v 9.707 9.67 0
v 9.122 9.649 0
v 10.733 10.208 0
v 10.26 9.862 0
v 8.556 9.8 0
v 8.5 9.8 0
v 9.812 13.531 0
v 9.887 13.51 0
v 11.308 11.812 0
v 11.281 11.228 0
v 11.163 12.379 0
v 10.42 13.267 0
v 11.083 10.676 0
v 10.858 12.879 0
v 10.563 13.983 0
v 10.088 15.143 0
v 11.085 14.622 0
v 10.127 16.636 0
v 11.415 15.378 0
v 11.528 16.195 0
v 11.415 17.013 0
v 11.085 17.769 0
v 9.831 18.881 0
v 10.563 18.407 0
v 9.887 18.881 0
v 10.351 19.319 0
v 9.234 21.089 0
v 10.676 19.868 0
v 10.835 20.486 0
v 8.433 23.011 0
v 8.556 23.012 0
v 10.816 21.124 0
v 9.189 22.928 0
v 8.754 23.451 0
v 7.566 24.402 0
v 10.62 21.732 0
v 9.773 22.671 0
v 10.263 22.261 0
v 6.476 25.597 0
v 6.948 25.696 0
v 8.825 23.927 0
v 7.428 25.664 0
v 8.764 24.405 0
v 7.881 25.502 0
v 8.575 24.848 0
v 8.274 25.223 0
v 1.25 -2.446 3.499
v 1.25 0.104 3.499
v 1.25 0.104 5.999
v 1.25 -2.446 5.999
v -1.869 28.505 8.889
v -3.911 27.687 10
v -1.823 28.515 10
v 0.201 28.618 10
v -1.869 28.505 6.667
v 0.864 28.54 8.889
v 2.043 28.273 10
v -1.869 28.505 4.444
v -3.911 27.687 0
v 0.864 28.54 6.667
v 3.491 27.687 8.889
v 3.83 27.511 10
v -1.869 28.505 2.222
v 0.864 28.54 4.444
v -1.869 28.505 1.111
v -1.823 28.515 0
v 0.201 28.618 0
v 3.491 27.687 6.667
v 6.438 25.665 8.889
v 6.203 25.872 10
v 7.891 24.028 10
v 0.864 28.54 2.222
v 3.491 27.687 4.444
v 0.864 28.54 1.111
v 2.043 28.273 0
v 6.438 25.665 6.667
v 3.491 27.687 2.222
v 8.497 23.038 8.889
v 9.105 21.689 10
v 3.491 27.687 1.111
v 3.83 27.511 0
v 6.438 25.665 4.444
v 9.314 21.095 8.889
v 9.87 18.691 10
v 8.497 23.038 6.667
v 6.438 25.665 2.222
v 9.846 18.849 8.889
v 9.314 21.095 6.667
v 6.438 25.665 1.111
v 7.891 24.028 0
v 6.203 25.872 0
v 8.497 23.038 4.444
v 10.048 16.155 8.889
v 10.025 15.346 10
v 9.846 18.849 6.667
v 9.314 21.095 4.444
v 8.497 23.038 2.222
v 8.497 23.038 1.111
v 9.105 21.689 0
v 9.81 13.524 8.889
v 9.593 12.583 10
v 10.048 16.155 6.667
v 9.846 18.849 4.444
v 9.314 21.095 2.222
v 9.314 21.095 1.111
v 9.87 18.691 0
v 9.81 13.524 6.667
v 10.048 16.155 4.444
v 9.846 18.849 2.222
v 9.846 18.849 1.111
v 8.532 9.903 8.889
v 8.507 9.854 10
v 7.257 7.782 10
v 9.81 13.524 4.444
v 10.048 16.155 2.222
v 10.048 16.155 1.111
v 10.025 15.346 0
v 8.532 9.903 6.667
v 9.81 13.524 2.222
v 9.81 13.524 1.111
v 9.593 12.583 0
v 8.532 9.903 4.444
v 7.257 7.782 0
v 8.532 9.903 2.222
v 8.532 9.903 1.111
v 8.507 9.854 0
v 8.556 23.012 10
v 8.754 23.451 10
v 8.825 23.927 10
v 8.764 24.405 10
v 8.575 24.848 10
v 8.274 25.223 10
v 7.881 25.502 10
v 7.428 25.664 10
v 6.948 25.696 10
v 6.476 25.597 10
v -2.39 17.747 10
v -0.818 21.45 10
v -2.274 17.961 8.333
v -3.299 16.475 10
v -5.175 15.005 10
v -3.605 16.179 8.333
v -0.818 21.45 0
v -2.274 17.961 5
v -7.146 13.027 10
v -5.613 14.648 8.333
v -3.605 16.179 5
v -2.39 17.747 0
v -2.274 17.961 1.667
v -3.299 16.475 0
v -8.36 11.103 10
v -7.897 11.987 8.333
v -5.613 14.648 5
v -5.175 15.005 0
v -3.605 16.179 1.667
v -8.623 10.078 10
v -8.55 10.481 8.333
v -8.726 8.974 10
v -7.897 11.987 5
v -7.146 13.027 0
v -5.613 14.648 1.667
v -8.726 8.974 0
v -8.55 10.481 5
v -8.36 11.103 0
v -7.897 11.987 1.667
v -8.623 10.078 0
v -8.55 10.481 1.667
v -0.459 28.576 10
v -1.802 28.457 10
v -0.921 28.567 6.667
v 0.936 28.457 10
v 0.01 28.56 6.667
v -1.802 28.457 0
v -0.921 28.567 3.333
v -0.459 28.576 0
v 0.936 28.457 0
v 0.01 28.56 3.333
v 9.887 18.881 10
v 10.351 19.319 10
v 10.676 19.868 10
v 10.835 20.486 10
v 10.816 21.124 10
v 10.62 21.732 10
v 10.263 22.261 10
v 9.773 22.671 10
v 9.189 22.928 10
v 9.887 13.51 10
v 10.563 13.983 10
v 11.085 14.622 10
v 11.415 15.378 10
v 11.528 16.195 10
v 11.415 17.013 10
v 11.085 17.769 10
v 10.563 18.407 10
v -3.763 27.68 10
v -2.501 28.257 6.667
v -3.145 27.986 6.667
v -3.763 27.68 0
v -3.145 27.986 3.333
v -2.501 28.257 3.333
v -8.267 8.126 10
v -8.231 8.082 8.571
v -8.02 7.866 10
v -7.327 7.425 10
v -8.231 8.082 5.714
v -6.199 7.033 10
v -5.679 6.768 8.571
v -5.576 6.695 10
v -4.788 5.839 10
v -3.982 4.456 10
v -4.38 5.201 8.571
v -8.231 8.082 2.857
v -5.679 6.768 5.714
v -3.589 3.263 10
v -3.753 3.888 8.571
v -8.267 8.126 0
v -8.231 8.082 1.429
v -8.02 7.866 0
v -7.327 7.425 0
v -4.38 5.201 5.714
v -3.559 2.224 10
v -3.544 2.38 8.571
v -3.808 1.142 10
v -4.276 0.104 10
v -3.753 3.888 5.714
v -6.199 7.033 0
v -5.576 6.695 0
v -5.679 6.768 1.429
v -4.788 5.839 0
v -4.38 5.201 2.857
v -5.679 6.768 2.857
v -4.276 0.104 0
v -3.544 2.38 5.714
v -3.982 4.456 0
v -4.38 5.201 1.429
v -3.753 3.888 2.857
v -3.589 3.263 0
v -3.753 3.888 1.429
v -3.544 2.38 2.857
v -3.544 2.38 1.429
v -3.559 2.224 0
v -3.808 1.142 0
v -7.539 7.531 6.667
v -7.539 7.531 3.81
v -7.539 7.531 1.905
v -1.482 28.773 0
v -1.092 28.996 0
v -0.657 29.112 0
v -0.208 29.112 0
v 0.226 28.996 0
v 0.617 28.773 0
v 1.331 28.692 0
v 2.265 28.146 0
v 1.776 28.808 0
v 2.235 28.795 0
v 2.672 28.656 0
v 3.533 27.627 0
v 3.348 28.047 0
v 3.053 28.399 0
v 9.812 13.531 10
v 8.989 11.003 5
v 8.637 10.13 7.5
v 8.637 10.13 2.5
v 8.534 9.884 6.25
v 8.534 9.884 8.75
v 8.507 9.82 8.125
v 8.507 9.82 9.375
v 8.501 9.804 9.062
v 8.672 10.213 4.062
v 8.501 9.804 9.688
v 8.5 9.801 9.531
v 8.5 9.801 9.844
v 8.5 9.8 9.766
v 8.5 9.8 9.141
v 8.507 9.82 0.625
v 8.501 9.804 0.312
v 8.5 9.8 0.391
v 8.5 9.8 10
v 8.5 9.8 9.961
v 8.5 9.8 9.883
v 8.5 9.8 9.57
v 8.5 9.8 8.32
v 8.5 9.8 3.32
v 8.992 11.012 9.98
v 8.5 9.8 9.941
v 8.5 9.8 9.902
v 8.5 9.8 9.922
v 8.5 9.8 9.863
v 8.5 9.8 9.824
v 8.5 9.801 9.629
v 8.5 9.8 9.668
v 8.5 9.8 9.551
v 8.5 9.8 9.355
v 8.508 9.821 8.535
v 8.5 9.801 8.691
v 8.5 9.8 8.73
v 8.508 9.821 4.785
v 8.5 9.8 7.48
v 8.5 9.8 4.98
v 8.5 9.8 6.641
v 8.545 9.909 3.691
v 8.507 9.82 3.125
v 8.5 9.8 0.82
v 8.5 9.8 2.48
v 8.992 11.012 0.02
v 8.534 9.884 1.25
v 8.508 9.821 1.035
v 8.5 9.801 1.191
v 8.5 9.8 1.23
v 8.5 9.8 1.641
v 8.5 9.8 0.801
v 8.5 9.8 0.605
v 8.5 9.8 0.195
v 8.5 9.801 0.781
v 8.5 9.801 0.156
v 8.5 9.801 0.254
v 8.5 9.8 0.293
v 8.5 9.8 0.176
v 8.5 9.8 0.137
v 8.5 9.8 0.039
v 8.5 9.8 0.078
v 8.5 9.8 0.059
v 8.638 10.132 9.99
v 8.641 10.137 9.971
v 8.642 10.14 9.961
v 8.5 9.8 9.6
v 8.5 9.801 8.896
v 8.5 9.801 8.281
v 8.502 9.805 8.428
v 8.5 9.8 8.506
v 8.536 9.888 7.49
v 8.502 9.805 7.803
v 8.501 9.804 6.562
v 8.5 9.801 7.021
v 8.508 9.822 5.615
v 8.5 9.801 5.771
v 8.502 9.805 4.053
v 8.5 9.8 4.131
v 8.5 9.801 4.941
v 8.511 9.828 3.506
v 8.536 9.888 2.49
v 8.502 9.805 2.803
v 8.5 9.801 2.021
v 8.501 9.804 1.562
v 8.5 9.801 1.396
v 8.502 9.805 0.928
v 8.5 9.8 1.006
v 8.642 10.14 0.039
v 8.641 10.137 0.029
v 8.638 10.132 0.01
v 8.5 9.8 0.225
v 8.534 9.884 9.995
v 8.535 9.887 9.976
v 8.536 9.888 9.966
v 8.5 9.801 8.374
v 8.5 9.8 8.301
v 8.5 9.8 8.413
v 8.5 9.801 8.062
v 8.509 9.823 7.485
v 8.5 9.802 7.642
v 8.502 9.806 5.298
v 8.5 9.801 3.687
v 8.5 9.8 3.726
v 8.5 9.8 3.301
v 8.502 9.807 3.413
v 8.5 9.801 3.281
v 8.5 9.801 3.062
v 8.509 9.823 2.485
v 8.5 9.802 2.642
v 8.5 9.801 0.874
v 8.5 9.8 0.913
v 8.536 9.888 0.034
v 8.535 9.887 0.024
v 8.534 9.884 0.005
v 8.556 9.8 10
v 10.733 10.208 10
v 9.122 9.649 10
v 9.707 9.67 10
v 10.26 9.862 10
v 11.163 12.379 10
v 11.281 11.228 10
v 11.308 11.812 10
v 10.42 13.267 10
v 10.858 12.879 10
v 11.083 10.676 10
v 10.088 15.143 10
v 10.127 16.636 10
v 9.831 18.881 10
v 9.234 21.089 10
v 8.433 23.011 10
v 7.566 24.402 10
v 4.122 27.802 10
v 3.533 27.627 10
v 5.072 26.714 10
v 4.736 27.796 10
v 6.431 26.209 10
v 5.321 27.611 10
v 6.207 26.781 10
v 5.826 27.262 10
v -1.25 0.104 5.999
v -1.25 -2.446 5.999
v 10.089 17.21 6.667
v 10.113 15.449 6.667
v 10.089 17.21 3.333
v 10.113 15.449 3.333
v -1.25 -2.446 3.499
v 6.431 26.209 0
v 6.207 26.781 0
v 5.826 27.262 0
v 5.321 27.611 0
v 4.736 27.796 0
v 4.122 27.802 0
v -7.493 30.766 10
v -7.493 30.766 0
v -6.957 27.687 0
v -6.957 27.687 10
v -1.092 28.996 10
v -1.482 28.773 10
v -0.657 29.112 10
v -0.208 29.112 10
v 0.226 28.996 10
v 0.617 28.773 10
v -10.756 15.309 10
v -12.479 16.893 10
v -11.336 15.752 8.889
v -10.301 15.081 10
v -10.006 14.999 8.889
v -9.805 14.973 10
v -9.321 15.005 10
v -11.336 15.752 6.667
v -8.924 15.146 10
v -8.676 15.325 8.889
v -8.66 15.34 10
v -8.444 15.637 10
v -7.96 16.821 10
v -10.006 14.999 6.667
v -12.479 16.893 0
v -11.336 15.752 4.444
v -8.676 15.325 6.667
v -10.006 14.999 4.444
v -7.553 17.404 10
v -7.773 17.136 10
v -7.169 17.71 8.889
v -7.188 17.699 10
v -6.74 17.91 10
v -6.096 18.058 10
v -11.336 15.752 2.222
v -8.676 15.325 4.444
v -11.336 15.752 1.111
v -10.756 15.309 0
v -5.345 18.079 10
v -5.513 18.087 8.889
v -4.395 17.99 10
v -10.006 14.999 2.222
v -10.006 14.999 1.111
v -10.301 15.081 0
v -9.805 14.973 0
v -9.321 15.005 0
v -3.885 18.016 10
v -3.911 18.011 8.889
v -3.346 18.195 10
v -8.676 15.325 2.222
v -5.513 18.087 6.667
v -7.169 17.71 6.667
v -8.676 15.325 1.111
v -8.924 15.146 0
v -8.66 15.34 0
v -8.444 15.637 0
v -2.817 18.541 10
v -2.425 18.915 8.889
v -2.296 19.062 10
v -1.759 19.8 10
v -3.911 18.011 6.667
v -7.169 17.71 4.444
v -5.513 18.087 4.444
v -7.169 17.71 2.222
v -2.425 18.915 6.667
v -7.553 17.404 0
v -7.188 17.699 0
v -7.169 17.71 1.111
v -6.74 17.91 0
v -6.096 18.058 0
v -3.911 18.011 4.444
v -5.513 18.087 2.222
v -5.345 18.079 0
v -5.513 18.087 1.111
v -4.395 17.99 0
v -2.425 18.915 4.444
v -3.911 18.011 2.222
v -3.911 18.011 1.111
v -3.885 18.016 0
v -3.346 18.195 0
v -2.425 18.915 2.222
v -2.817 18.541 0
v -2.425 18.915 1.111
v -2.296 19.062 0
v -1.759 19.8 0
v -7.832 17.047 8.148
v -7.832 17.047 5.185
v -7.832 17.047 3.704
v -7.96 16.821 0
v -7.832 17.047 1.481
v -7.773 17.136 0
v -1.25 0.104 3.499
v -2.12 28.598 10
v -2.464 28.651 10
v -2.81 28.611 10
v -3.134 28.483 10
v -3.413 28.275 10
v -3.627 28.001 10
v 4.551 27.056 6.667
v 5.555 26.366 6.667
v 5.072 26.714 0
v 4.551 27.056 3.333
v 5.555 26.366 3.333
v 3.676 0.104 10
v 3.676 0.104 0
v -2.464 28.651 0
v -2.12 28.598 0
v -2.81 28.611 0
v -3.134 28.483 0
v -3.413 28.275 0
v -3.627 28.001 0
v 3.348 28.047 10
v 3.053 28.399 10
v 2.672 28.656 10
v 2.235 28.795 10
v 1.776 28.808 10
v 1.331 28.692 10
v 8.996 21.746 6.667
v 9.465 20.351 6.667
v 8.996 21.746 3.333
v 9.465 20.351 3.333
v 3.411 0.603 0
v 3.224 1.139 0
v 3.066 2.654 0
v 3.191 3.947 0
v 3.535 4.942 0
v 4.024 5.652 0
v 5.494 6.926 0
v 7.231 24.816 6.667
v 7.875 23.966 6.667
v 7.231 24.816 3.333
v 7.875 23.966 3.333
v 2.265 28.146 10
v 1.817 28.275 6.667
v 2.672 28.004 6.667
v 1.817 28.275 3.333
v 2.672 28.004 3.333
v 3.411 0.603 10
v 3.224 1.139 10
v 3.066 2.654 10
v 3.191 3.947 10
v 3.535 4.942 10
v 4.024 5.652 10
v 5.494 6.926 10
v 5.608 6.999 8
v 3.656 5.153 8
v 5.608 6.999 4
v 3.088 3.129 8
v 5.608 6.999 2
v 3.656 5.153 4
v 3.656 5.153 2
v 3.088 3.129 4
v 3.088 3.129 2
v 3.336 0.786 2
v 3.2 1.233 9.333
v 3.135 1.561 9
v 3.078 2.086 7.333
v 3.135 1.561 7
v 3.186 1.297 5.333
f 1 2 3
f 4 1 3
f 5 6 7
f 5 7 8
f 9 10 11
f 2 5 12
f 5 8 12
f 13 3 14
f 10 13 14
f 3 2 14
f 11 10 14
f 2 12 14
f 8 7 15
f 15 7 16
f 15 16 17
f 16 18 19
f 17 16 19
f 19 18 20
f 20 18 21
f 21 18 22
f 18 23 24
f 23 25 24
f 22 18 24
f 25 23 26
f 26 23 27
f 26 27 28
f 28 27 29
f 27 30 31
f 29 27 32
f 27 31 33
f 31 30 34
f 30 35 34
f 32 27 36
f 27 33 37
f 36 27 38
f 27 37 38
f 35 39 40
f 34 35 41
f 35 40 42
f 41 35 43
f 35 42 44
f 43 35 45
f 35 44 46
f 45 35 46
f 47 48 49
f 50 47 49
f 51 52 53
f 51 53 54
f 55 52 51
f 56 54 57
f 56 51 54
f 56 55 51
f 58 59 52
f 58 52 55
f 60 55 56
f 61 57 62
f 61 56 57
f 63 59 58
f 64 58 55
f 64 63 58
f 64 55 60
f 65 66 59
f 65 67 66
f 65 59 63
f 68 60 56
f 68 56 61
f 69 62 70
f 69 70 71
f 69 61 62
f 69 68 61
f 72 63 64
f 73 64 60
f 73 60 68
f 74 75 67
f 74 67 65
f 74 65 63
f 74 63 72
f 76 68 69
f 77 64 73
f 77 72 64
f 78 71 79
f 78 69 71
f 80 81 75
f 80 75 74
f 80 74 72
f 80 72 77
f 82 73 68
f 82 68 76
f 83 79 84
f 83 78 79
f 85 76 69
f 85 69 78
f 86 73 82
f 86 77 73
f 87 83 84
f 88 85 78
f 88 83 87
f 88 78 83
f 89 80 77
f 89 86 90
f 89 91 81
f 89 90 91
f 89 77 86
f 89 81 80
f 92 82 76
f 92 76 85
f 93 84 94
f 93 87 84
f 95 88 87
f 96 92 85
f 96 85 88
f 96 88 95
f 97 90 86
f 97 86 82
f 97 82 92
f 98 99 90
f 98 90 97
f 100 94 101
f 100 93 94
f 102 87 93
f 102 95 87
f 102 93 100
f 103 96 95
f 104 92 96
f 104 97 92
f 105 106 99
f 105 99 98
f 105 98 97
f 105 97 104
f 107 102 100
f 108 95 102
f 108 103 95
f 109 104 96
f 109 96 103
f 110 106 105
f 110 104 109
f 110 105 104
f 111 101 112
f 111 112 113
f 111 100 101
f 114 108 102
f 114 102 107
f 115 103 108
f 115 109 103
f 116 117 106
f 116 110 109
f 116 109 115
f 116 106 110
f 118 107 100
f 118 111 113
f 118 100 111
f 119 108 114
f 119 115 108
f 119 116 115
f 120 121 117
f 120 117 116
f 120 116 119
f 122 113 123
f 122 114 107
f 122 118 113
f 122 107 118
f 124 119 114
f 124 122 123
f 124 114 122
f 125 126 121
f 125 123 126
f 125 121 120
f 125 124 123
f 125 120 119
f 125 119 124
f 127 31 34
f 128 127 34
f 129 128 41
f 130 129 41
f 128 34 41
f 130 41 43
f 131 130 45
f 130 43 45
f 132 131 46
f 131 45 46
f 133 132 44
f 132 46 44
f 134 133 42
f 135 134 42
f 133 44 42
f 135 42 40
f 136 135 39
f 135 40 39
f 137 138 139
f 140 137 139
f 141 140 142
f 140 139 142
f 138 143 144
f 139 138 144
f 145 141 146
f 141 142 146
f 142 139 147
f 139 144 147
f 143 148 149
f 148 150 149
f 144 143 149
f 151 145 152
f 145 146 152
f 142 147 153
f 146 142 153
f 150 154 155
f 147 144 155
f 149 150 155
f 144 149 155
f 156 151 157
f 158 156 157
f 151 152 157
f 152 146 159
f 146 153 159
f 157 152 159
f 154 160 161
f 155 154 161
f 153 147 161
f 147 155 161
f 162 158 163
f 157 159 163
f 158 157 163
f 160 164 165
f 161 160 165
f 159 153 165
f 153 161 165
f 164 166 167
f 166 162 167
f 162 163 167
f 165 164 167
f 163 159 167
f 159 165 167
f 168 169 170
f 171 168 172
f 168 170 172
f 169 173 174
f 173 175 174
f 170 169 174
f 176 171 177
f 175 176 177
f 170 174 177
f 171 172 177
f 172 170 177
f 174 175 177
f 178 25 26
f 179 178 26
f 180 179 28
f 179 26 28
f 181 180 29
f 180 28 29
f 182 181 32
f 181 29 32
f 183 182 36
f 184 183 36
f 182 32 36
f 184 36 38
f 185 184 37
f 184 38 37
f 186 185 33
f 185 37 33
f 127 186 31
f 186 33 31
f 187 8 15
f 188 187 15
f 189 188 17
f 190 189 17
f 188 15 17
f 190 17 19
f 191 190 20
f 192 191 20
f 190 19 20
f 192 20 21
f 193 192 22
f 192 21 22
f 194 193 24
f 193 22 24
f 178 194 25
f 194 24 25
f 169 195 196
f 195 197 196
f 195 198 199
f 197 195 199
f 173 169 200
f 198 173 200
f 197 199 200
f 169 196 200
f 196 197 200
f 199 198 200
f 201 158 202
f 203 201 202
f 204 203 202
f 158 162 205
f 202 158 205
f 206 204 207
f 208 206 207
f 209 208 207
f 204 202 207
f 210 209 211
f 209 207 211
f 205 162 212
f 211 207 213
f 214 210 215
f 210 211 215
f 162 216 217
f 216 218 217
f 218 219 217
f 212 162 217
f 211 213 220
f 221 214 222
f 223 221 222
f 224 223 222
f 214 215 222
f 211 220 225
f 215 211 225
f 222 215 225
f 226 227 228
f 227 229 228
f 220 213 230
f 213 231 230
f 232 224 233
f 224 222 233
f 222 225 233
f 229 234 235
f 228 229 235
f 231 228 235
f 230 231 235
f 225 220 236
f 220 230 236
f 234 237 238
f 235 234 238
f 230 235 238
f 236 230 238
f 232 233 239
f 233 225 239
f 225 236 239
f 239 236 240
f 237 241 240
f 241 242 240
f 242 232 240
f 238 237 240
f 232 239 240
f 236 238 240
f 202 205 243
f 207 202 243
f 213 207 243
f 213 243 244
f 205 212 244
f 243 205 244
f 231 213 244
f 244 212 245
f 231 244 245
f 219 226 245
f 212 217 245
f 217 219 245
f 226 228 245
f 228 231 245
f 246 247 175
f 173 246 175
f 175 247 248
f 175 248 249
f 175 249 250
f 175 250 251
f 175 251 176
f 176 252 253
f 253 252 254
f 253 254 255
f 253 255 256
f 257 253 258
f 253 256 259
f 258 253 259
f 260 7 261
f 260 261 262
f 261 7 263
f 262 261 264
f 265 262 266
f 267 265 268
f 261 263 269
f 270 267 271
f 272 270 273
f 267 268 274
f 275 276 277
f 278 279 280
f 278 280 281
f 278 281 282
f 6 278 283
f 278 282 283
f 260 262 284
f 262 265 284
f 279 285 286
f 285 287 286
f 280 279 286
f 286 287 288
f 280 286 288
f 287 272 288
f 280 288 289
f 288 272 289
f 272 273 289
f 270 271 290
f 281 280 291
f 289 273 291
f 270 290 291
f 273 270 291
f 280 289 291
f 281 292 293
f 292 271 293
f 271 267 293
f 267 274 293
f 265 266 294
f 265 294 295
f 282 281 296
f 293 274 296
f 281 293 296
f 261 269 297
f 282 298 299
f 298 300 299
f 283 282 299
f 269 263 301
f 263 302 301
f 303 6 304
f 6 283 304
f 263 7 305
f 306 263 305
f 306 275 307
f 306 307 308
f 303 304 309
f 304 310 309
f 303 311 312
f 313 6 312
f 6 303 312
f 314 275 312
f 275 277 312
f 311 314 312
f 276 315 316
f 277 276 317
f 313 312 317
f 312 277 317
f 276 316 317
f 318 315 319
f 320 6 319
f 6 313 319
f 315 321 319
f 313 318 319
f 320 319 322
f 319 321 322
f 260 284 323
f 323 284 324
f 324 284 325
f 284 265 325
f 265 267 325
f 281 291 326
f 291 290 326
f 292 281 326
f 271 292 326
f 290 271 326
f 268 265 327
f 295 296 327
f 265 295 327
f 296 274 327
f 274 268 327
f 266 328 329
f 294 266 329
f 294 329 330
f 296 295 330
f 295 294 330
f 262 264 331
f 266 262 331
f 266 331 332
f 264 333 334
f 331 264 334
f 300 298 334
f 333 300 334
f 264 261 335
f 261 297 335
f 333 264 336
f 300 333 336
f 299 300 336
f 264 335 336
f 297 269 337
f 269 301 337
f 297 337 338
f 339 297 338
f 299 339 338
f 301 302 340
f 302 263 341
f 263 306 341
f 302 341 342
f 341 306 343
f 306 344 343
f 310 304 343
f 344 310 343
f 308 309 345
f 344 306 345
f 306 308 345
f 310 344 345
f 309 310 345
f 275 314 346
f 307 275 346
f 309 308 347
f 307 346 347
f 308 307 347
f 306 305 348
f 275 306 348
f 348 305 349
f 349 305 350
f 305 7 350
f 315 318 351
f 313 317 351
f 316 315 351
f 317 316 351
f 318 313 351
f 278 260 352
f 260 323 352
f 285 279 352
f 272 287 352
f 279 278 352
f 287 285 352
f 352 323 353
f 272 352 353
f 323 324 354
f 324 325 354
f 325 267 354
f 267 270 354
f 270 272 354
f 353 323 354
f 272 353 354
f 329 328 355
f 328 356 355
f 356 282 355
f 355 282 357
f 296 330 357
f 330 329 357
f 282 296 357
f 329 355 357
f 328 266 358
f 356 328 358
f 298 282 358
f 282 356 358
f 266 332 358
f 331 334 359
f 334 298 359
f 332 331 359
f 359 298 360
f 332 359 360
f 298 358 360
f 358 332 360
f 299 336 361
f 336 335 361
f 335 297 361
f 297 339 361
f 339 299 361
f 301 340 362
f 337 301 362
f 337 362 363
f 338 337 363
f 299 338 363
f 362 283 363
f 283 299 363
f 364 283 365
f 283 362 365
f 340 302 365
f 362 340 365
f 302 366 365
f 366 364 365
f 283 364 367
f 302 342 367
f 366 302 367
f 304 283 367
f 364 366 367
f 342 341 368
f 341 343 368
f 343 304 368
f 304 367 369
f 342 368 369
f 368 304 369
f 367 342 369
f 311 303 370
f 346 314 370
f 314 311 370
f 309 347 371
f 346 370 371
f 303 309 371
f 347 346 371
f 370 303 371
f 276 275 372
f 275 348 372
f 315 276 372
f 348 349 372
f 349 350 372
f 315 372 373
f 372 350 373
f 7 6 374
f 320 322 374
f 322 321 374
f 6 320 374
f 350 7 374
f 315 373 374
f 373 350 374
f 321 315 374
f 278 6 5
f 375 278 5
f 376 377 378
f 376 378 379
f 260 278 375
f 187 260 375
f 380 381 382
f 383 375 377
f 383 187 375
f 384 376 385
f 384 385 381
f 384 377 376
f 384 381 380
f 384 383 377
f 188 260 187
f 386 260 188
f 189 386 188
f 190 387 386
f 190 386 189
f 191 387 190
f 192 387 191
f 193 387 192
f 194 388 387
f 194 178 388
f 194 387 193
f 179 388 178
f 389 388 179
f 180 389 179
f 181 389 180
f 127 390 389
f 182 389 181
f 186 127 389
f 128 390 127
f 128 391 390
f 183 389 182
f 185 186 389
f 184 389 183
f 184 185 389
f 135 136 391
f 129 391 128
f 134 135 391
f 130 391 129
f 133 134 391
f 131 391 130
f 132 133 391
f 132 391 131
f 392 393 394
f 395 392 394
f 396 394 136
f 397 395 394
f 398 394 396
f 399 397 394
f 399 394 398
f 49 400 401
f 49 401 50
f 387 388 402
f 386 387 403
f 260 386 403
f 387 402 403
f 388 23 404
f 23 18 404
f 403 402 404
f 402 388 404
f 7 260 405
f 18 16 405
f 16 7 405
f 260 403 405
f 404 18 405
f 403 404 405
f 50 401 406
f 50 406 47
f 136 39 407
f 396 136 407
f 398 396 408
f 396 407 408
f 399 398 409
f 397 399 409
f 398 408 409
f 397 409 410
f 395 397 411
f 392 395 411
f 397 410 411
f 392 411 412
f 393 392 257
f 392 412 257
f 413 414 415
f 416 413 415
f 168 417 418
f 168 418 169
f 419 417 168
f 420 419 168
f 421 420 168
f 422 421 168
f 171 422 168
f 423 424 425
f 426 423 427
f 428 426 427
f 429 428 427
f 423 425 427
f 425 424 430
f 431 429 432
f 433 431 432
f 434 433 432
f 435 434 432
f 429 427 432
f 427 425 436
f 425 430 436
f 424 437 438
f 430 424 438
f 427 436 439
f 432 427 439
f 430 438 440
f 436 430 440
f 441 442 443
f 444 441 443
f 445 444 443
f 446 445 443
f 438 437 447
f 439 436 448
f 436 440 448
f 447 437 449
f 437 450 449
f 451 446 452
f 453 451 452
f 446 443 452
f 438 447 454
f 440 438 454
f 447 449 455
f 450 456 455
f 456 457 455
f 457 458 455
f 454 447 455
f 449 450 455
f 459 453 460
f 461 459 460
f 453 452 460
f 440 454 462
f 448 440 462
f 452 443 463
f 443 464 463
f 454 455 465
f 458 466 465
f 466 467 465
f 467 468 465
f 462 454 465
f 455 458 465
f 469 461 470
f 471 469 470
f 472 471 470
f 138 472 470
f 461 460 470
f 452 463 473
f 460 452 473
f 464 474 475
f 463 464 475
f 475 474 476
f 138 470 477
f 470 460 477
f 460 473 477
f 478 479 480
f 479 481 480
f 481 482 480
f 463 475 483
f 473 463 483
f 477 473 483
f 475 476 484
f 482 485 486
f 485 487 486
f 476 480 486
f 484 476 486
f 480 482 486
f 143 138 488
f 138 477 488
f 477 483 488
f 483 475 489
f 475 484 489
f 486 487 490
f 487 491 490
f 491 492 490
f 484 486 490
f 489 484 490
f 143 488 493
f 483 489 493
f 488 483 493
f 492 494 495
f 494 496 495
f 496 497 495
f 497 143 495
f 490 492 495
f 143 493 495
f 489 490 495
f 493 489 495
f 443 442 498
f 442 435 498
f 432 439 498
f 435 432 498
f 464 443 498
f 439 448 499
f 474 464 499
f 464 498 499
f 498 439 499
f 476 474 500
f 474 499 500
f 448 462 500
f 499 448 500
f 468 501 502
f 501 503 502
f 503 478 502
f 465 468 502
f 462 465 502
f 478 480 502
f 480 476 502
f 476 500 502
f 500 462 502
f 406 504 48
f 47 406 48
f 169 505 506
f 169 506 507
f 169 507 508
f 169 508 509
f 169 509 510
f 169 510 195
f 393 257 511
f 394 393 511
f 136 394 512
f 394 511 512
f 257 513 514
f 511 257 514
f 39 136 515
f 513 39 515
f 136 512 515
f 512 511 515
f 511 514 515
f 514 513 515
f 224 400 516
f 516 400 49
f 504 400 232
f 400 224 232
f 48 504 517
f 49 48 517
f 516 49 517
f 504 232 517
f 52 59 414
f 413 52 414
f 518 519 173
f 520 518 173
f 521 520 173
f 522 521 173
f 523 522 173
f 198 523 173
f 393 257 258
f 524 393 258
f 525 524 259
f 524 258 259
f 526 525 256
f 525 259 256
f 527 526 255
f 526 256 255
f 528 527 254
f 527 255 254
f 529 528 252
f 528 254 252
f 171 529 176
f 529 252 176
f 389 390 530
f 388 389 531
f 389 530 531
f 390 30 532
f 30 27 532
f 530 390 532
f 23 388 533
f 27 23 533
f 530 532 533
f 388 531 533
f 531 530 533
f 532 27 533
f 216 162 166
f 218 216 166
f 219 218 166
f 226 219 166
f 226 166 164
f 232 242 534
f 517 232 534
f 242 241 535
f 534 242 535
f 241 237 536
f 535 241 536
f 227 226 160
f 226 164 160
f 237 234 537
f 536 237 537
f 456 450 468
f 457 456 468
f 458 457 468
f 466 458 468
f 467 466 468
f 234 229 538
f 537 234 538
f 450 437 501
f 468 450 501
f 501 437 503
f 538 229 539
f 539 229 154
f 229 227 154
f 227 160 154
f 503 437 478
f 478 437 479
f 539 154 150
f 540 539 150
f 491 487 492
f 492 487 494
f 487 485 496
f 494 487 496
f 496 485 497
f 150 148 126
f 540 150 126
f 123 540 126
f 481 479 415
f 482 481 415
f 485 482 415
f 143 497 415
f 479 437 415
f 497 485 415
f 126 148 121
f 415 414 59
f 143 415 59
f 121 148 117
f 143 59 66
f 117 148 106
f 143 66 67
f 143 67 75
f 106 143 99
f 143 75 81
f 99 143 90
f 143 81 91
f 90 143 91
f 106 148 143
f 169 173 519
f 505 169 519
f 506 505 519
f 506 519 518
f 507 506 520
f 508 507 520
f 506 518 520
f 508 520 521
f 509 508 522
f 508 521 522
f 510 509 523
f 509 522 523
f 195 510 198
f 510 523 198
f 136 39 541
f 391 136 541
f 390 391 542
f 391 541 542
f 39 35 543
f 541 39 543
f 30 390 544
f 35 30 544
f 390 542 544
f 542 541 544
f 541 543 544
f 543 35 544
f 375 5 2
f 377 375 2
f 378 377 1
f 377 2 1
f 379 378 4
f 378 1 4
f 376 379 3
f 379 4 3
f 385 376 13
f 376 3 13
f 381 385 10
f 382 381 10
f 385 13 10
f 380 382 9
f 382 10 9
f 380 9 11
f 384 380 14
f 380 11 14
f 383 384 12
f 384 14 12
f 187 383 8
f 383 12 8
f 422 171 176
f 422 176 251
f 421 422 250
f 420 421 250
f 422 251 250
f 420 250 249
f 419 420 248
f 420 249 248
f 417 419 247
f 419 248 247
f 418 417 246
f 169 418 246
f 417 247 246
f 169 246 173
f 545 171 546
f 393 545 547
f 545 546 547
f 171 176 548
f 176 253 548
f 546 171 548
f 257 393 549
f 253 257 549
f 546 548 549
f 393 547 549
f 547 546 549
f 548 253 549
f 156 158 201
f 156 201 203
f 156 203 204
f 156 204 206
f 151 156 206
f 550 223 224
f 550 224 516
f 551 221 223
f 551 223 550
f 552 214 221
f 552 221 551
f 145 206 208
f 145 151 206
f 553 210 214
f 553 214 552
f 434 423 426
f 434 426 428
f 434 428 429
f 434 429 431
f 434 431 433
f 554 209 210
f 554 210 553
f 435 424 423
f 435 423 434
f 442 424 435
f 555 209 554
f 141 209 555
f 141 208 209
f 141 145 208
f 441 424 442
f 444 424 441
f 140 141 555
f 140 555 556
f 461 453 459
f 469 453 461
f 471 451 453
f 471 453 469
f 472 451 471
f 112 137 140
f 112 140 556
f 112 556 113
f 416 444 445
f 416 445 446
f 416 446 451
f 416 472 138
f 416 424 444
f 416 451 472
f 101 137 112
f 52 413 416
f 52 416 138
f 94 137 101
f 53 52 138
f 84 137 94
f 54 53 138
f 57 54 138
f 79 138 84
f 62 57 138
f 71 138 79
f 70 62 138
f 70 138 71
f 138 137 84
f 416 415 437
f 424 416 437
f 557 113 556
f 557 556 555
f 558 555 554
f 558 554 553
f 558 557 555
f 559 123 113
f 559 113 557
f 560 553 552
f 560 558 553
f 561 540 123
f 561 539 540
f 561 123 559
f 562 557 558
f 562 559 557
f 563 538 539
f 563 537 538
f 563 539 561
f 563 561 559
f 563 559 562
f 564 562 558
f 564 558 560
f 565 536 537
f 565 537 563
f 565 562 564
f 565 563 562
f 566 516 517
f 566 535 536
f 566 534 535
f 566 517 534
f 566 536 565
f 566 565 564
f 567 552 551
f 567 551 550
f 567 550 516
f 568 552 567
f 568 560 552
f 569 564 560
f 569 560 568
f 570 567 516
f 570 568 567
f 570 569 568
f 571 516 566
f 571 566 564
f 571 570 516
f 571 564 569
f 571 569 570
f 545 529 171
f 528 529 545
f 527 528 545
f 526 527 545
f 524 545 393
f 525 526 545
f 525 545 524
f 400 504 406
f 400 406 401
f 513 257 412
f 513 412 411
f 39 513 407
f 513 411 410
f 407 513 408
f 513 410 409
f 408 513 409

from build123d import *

# Parameters (mm, degrees)
F2_DEPTH = 10
F3_DEPTH = 10
F5_W     = 2.5
F5_H     = 2.5
F6_DEPTH = 2.55


with BuildPart() as f2:
    # F1 (on Top) → F2 (new body)
    with BuildSketch(Plane.XY):
        with BuildLine():
            ThreePointArc((9.8868366331, 18.8806653023), (10.7391583273, 21.4351938959), (8.5562430322, 23.0122003704))
            Line((8.5562430322, 23.0122003704), (8.4334415838, 23.0112200522))
            add(Edge.make_bspline(
                [(8.4334415838, 23.0112200522), (9.039813847, 21.8301859064), (9.5207915119, 20.3689476314), (9.8307114094, 18.8806653023)],
                knots=[0.5688861462, 0.5688861462, 0.5688861462, 0.5688861462, 0.7094700668, 0.7094700668, 0.7094700668, 0.7094700668], degree=3))
            Line((9.8307114094, 18.8806653023), (9.8868366331, 18.8806653023))
        make_face()
        with BuildLine():
            ThreePointArc((9.8868366331, 13.5100632906), (11.527763497, 16.1953642964), (9.8868366331, 18.8806653023))
            Line((9.8868366331, 18.8806653023), (9.8307114094, 18.8806653023))
            add(Edge.make_bspline(
                [(9.8307114094, 18.8806653023), (10.1739742387, 17.2322651606), (10.3073926431, 15.5506888351), (9.8119792172, 13.5314884899)],
                knots=[0.7094700668, 0.7094700668, 0.7094700668, 0.7094700668, 0.865178799, 0.865178799, 0.865178799, 0.865178799], degree=3))
            Line((9.8119792172, 13.5314884899), (9.8868366331, 13.5100632906))
        make_face()
        with BuildLine():
            ThreePointArc((8.5562430322, 9.800106287), (11.202384319, 10.9446455586), (9.8868366331, 13.5100632906))
            Line((9.8868366331, 13.5100632906), (9.8119792172, 13.5314884899))
            add(Edge.make_bspline(
                [(9.8119792172, 13.5314884899), (9.3859754601, 11.7951872747), (8.4888256969, 9.7954761091), (8.5001109134, 9.8000746355), (8.5001885891, 9.800106287)],
                knots=[0.865178799, 0.865178799, 0.865178799, 0.865178799, 0.9990720313, 1, 1, 1, 1], degree=3))
            Line((8.5001885891, 9.800106287), (8.5562430322, 9.800106287))
        make_face()
        with BuildLine():
            ThreePointArc((8.5562430322, 23.0122003704), (8.4374020883, 25.0457214806), (6.4764507115, 25.5970843136))
            add(Edge.make_bspline(
                [(6.4764507115, 25.5970843136), (7.2943342217, 24.8398392998), (7.9105162063, 24.0297243015), (8.4334415838, 23.0112200522)],
                knots=[0.447648906, 0.447648906, 0.447648906, 0.447648906, 0.5688861462, 0.5688861462, 0.5688861462, 0.5688861462], degree=3))
            Line((8.4334415838, 23.0112200522), (8.5562430322, 23.0122003704))
        make_face()
    extrude(amount=F2_DEPTH)


with BuildPart() as f2b:
    # F1 (on Top) → F2, piece 2 (new body)
    with BuildSketch(Plane.XY):
        with BuildLine():
            ThreePointArc((6.4764507115, 25.5970843136), (5.5866855056, 27.4554808028), (3.5334266722, 27.6270844042))
            add(Edge.make_bspline(
                [(3.5334266722, 27.6270844042), (4.536544335, 27.1289926967), (5.6176829257, 26.3921824122), (6.4764507115, 25.5970843136)],
                knots=[0.3203512712, 0.3203512712, 0.3203512712, 0.3203512712, 0.447648906, 0.447648906, 0.447648906, 0.447648906], degree=3))
        make_face()
    extrude(amount=F2_DEPTH)


with BuildPart() as f2c:
    # F1 (on Top) → F2, piece 3 (new body)
    with BuildSketch(Plane.XY):
        with BuildLine():
            ThreePointArc((3.5334266722, 27.6270844042), (2.4583213434, 28.7408966239), (0.9364597499, 28.4574069083))
            add(Edge.make_bspline(
                [(0.9364597499, 28.4574069083), (1.840939808, 28.3149747578), (2.6574338214, 28.0620530934), (3.5334266722, 27.6270844042)],
                knots=[0.2091860289, 0.2091860289, 0.2091860289, 0.2091860289, 0.3203512712, 0.3203512712, 0.3203512712, 0.3203512712], degree=3))
        make_face()
    extrude(amount=F2_DEPTH)


with BuildPart() as f2d:
    # F1 (on Top) → F2, piece 4 (new body)
    with BuildSketch(Plane.XY):
        with BuildLine():
            ThreePointArc((0.9364597499, 28.4574069083), (-0.4326906055, 29.1264908894), (-1.801840961, 28.4574069083))
            add(Edge.make_bspline(
                [(-1.801840961, 28.4574069083), (-0.9647864012, 28.6319195592), (0.0300204904, 28.6001475821), (0.9364597499, 28.4574069083)],
                knots=[0.0977799908, 0.0977799908, 0.0977799908, 0.0977799908, 0.2091860289, 0.2091860289, 0.2091860289, 0.2091860289], degree=3))
        make_face()
    extrude(amount=F2_DEPTH)


with BuildPart() as f2e:
    # F1 (on Top) → F2, piece 5 (new body)
    with BuildSketch(Plane.XY):
        with BuildLine():
            add(Edge.make_bspline(
                [(-3.7628188729, 27.6800841093), (-3.1496672197, 27.9921614848), (-2.5365155664, 28.3042388603), (-1.801840961, 28.4574069083)],
                knots=[0, 0, 0, 0, 0.0977799908, 0.0977799908, 0.0977799908, 0.0977799908], degree=3))
            ThreePointArc((-1.801840961, 28.4574069083), (-2.9762072449, 28.5578462507), (-3.7628188729, 27.6800841093))
        make_face()
    extrude(amount=F2_DEPTH)


with BuildPart() as f3:
    # F0 (on Top) → F3 (new body)
    with BuildSketch(Plane.XY):
        with BuildLine():
            Line((-6.956886887, 27.6873964372), (-12.4794470743, 16.8932903899))
            add(Edge.make_bspline(
                [(-12.4794470743, 16.8932903899), (-12.1115177575, 16.5008815726), (-11.3856280956, 15.7266961767), (-10.0969803778, 14.797217917), (-8.4463129775, 15.1270256477), (-8.1402571228, 16.6919926648), (-7.2754926111, 17.8806322708), (-5.4921641458, 18.2159814054), (-3.8671115183, 17.7838675938), (-2.2150015818, 18.8471769684), (-1.3242353255, 20.5076393734), (-0.8184604298, 21.4504458548)],
                knots=[0, 0, 0, 0, 0.108789793, 0.2146319481, 0.314822017, 0.4178421681, 0.5188301736, 0.6304095743, 0.7388070946, 0.8516953089, 1, 1, 1, 1], degree=3))
            add(Edge.make_bspline(
                [(-0.8184604298, 21.4504458548), (-1.2927268673, 20.1893128102), (-2.1307454779, 17.9609178023), (-3.5077259982, 16.0449730888), (-5.7152057676, 14.8193722854), (-7.9863974289, 12.0731321581), (-8.6182414833, 10.5440754701), (-8.6904035616, 9.4907118054), (-8.7257695492, 8.9744677169)],
                knots=[0, 0, 0, 0, 0.2066303506, 0.3651113923, 0.5339863226, 0.7329907798, 0.869141175, 1, 1, 1, 1], degree=3))
            add(Edge.make_bspline(
                [(-8.7257695492, 8.9744677169), (-8.591756213, 8.6629400923), (-8.3084345704, 8.00433013), (-7.1940625433, 7.2524126773), (-5.5358453232, 6.9909292602), (-4.33872477, 5.2079150674), (-3.6978072501, 3.9118294872), (-3.3763865891, 2.3527355335), (-3.8760068449, 0.7834319662), (-4.2757854916, 0.1036788831)],
                knots=[0, 0, 0, 0, 0.0798158481, 0.1687410957, 0.2693440467, 0.3820571472, 0.4773704198, 0.5748375963, 0.6970054399, 0.6970054399, 0.6970054399, 0.6970054399], degree=3))
            Line((-4.2757854916, 0.1036788831), (-1.8036556303, 0.1036788831))
            Line((-1.8036556303, 0.1036788831), (1.1612173494, 0.1036788831))
            Line((1.1612173494, 0.1036788831), (3.6761645139, 0.1036788831))
            add(Edge.make_bspline(
                [(7.2574619425, 7.7816450109), (6.7262872216, 7.574060732), (5.5507119295, 7.1146432565), (3.3993998544, 5.2674837278), (3.0089654531, 3.1526263567), (3.0682331316, 1.2510111623), (3.5415944593, 0.3191754785), (3.6761645139, 0.1036788831)],
                knots=[0, 0, 0, 0, 0.1347233142, 0.298164414, 0.4427128901, 0.5957610218, 0.6453793664, 0.6453793664, 0.6453793664, 0.6453793664], degree=3))
            add(Edge.make_bspline(
                [(-3.9109068398, 27.6873964372), (-3.2681793071, 28.0126523232), (-1.9088345918, 28.7005563686), (0.94648276, 28.6689628353), (3.5565481014, 27.821792279), (6.5942428944, 25.7591665199), (8.7142686993, 23.1055108927), (10.115857033, 18.85870485), (10.1268795283, 13.5465858472), (8.6523498629, 9.9242471528), (7.6872255011, 8.4417785656), (7.2574619425, 7.7816450109)],
                knots=[0, 0, 0, 0, 0.0901265526, 0.1906142911, 0.2916198244, 0.406516675, 0.5175523832, 0.6450505582, 0.785299628, 0.9043953302, 1, 1, 1, 1], degree=3))
            Line((-3.9109068398, 27.6873964372), (-7.4931675838, 30.7661991324))
            Line((-7.4931675838, 30.7661991324), (-6.956886887, 27.6873964372))
        make_face()
    extrude(amount=F3_DEPTH)

    # F5 (on face) → F6 (join)
    with BuildSketch(Plane.XZ.offset(-0.1036788831)):
        with Locations((2.79e-08, 4.7491337452)):
            Rectangle(F5_W, F5_H)
    extrude(amount=F6_DEPTH)


solid = Compound([f2.part, f2b.part, f2c.part, f2d.part, f2e.part, f3.part])
